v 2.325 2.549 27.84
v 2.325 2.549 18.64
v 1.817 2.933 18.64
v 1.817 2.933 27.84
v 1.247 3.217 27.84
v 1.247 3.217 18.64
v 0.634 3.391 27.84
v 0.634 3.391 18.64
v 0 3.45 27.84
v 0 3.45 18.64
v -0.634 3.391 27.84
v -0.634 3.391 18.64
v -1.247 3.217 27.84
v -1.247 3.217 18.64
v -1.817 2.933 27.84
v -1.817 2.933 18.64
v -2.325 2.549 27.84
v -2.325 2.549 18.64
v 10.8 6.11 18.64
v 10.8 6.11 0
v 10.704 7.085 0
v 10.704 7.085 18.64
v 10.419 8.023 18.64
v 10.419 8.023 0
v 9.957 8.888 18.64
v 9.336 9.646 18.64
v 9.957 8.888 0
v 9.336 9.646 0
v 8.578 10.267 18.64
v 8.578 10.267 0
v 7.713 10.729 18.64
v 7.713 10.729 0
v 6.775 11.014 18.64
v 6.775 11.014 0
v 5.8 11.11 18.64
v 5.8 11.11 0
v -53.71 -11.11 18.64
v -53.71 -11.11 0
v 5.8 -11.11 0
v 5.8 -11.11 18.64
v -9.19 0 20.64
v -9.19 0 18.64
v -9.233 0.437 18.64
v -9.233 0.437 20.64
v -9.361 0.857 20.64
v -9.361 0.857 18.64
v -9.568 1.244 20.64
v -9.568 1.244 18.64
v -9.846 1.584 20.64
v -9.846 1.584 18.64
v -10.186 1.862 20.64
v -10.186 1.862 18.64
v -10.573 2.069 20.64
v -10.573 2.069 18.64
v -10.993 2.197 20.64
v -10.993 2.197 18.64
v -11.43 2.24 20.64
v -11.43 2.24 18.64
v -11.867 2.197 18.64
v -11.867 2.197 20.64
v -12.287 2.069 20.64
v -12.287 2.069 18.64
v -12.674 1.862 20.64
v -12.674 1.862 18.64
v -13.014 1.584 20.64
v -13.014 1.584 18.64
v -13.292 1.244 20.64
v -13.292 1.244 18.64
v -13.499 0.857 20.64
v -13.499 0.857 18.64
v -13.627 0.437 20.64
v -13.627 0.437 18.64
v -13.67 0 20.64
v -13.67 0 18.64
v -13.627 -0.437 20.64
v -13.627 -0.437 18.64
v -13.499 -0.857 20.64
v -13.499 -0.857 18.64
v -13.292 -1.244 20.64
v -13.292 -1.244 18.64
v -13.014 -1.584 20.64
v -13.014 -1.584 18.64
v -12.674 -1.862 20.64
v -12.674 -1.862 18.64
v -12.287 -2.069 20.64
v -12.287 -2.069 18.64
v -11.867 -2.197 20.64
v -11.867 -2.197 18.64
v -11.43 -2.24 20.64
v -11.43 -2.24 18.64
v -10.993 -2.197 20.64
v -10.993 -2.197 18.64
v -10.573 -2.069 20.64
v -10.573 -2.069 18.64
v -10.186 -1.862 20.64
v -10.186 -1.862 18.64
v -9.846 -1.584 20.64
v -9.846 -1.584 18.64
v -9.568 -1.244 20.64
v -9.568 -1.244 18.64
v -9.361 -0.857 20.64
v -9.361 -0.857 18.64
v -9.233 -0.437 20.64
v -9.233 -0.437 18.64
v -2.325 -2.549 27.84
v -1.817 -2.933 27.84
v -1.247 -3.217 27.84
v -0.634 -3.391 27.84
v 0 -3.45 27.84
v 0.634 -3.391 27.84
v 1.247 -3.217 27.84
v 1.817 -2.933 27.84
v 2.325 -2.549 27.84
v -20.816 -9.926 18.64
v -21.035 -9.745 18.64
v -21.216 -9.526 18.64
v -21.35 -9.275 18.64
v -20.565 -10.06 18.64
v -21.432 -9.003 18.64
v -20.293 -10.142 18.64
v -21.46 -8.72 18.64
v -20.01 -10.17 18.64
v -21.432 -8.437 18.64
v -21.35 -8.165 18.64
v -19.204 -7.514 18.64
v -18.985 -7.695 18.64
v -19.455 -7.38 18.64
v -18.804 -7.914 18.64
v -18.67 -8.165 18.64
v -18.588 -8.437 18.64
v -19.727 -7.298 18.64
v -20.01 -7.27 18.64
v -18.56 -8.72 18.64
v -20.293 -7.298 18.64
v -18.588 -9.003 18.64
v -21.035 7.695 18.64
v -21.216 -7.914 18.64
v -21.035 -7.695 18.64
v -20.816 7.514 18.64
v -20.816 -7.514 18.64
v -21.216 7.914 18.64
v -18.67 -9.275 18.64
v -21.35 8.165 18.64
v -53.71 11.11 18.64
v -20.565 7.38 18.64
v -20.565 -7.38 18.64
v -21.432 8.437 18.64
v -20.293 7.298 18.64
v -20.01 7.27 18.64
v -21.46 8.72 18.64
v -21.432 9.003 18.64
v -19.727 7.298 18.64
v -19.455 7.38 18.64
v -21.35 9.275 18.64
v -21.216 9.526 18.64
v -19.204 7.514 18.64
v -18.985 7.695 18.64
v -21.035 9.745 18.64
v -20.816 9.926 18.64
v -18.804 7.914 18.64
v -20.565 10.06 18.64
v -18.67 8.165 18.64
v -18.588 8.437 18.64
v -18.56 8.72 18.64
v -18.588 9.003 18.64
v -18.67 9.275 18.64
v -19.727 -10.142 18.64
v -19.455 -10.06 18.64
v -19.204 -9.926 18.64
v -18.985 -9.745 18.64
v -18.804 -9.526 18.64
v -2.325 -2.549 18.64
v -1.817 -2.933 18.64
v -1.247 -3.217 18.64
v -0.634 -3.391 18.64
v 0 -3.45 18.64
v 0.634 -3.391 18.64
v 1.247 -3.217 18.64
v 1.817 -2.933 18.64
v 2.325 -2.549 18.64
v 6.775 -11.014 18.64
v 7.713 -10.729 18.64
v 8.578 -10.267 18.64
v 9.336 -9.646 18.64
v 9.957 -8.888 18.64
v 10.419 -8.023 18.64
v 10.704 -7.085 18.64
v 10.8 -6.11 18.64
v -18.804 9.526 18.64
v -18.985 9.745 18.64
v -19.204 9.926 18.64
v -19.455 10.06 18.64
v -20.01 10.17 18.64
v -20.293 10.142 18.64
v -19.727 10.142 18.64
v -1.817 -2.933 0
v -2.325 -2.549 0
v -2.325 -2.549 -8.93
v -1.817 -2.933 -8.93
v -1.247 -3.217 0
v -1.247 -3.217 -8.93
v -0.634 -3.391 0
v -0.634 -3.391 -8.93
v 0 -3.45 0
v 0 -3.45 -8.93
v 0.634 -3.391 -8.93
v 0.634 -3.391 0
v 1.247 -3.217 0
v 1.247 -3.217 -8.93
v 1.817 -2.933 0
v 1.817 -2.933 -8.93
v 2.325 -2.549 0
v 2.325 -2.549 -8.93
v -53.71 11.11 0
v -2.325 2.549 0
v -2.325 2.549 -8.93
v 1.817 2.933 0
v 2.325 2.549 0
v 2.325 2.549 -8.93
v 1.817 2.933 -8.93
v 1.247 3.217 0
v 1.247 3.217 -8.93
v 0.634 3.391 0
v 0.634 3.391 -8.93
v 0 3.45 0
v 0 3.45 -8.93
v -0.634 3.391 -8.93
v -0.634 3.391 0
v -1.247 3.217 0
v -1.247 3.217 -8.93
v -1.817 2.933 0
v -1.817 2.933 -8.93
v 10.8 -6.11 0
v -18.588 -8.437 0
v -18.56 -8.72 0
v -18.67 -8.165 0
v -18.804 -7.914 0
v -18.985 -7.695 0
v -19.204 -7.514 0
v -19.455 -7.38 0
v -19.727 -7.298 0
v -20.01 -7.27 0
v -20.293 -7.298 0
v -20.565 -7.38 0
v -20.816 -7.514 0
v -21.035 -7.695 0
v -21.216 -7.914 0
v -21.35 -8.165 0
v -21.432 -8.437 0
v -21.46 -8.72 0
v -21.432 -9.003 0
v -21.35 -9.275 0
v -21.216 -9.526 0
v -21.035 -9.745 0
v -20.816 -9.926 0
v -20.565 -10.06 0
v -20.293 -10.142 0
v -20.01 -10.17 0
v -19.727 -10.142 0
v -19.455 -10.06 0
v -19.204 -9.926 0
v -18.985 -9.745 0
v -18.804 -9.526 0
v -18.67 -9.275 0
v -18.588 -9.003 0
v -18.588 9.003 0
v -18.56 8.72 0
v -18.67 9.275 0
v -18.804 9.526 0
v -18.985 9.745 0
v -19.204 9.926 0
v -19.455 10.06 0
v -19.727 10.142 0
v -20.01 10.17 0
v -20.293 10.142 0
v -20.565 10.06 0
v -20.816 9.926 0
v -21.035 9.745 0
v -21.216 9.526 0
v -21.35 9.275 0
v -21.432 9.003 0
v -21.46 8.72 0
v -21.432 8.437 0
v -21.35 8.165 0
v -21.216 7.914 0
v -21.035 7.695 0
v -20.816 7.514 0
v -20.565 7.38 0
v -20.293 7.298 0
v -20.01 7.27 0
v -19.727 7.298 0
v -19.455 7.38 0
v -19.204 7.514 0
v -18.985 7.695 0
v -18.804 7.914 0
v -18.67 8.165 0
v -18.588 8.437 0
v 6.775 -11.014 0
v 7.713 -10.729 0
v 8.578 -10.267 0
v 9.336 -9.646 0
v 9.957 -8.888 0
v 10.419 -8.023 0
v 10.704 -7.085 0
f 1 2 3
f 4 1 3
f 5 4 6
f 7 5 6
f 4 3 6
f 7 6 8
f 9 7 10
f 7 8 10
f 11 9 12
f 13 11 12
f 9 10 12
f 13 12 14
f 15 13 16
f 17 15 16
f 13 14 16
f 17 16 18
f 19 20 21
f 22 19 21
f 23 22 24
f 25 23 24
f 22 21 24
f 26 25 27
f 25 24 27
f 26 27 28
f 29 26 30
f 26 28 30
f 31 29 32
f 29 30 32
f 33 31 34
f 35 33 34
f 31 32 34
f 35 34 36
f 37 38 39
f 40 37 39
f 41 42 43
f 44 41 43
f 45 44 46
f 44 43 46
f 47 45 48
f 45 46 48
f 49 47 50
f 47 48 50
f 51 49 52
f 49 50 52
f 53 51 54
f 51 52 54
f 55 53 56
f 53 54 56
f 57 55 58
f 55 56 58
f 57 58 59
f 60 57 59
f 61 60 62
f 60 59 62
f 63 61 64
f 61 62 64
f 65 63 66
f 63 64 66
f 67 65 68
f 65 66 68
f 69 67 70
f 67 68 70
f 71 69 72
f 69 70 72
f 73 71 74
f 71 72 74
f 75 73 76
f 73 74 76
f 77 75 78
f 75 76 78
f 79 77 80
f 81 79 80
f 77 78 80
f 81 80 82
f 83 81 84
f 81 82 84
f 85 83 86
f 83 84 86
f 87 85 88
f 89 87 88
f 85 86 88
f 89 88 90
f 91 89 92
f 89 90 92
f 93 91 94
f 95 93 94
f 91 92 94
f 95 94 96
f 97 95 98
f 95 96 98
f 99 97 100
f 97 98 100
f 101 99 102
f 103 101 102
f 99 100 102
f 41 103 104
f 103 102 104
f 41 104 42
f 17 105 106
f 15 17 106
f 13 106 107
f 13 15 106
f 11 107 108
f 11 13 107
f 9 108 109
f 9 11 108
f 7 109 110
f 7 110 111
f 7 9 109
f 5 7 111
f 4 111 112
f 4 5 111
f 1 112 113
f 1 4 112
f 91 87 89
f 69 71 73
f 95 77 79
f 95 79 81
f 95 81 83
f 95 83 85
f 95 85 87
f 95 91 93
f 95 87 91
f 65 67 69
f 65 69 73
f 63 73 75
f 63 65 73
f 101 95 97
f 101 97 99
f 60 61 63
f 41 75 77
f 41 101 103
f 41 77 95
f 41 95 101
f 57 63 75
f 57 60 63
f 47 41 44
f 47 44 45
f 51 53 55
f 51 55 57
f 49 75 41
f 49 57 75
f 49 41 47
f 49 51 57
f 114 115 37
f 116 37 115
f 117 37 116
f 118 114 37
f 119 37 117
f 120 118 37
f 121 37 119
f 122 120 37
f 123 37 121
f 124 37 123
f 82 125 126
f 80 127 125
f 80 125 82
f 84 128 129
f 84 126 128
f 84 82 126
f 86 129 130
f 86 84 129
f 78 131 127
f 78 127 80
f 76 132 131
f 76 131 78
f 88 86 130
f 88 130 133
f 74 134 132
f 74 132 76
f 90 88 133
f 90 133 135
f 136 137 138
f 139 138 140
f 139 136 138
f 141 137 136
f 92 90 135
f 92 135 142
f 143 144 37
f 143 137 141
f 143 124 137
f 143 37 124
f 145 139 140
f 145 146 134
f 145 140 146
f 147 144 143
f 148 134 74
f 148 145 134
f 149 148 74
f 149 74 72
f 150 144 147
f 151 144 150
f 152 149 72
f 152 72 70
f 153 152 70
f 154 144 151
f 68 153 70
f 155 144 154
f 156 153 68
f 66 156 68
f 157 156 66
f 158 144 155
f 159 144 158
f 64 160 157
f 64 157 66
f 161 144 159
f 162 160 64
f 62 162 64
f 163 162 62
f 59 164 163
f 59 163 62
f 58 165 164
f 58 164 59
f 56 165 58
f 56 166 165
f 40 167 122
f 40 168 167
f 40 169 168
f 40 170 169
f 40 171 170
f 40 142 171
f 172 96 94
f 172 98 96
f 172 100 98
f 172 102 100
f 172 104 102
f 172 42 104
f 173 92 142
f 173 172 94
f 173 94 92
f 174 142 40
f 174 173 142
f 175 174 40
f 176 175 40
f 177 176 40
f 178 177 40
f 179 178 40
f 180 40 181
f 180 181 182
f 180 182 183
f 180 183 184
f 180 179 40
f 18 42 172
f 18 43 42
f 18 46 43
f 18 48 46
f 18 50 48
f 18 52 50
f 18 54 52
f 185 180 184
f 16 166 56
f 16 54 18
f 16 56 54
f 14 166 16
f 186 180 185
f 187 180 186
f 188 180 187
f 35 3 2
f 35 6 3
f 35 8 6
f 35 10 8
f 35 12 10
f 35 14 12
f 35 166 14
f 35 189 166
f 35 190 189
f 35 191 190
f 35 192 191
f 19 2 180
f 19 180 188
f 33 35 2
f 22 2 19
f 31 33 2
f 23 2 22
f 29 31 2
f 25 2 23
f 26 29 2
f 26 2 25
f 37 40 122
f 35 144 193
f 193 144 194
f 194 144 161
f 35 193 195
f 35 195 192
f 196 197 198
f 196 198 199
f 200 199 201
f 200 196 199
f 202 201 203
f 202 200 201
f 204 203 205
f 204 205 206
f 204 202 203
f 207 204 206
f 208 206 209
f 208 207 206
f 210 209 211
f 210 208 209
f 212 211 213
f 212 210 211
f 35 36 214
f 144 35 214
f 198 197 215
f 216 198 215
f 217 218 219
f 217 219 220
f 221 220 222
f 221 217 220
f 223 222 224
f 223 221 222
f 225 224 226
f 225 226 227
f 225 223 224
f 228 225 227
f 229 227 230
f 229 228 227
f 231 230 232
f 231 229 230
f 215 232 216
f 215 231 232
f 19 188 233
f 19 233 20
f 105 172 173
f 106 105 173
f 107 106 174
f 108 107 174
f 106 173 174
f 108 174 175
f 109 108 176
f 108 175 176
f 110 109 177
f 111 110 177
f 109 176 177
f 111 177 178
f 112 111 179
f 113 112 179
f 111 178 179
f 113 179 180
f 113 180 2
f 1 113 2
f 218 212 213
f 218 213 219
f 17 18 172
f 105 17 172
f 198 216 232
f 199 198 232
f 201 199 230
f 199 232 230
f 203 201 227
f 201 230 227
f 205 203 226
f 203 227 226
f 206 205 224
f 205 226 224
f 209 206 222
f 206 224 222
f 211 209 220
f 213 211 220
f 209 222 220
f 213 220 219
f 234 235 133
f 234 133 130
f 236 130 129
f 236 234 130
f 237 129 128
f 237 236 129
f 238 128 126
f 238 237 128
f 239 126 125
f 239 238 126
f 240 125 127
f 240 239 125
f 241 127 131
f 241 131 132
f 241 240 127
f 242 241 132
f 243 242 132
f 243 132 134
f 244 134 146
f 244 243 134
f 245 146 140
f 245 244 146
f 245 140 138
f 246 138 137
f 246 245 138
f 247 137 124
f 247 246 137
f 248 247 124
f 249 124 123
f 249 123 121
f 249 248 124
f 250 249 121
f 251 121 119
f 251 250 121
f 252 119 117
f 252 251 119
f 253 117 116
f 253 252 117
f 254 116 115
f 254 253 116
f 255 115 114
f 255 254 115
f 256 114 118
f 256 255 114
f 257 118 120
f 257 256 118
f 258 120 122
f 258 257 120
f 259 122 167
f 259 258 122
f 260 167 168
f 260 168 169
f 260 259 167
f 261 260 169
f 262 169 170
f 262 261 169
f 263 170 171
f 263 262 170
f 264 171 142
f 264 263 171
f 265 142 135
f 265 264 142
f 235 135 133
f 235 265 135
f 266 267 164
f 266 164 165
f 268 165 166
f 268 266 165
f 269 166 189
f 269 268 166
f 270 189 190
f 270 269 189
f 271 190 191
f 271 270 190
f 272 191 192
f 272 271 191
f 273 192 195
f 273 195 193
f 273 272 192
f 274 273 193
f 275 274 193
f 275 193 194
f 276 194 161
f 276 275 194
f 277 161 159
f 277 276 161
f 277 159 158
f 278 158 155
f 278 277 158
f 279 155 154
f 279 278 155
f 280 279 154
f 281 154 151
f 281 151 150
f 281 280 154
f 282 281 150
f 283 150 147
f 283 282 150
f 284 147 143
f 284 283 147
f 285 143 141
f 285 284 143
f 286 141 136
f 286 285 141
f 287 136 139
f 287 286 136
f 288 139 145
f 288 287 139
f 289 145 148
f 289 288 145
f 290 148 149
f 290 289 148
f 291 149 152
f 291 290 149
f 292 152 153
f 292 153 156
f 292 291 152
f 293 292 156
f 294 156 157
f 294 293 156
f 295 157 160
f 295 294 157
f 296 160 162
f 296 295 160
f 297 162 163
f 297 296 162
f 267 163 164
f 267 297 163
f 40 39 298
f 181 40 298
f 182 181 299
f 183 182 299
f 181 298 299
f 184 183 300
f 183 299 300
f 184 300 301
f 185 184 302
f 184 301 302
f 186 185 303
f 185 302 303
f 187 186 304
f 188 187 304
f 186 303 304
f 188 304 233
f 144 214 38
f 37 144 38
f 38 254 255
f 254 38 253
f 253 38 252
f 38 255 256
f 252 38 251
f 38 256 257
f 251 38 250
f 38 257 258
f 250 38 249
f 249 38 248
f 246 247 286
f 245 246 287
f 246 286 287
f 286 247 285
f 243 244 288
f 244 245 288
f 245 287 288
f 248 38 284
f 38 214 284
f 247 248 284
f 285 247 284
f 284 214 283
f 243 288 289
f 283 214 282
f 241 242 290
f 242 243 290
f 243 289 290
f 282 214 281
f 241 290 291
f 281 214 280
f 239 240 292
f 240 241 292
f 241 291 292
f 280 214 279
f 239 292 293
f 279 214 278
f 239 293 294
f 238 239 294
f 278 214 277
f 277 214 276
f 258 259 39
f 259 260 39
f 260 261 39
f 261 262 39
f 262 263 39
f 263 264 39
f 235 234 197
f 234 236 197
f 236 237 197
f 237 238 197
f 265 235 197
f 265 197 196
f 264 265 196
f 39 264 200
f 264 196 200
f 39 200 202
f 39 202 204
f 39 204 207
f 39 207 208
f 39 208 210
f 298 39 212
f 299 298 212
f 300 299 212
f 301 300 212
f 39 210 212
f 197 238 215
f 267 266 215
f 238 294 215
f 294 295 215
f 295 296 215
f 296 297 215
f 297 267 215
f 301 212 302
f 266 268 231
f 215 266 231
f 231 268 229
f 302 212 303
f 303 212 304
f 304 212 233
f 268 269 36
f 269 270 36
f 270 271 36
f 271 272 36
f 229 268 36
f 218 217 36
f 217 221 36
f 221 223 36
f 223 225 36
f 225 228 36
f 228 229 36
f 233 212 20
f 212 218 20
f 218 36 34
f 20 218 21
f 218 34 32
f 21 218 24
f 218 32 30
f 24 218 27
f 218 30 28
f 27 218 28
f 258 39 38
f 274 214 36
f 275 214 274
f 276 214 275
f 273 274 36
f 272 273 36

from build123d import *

# Parameters (mm, degrees)
F0_R     = 1.45
F0_R_2   = 2.24
F0_R_3   = 4.865
F0_R_4   = 3.415
F1_DEPTH = 18.64
F3_DEPTH = 9.2
F4_R     = 2.24
F5_DEPTH = 2
F6_W     = 4.65
F6_H     = 5.0977936404
F7_DEPTH = 8.93


with BuildPart() as f1:
    # F0 (on Top) → F1 (new body)
    with BuildSketch(Plane.XY):
        with BuildLine():
            Line((-53.71, -11.11), (5.8, -11.11))
            ThreePointArc((5.8, -11.11), (9.3355339059, -9.6455339059), (10.8, -6.11))
            Line((10.8, -6.11), (10.8, 6.11))
            ThreePointArc((10.8, 6.11), (9.3355339059, 9.6455339059), (5.8, 11.11))
            Line((5.8, 11.11), (-53.71, 11.11))
            Line((-53.71, 11.11), (-53.71, -11.11))
        make_face()
        with Locations((-20.01, -8.72)):
            Circle(F0_R, mode=Mode.SUBTRACT)
        with Locations((-11.43, 0)):
            Circle(F0_R_2, mode=Mode.SUBTRACT)
        Circle(F0_R_3, mode=Mode.SUBTRACT)
        with Locations((-20.01, 8.72)):
            Circle(F0_R, mode=Mode.SUBTRACT)
        Circle(F0_R_3)
        Circle(F0_R_4, mode=Mode.SUBTRACT)
        Circle(F0_R_4)
        with Locations((-11.43, 0)):
            Circle(F0_R_2)
    extrude(amount=F1_DEPTH)

    # F2 (on face) → F3 (join)
    with BuildSketch(Plane.XY.offset(18.64)):
        with BuildLine():
            Line((-2.325, 2.5488968202), (-2.325, -2.5488968202))
            ThreePointArc((-2.325, -2.5488968202), (0, -3.45), (2.325, -2.5488968202))
            Line((2.325, -2.5488968202), (2.325, 2.5488968202))
            Line((2.325, 2.5488968202), (-2.325, 2.5488968202))
        make_face()
        with BuildLine():
            ThreePointArc((2.325, 2.5488968202), (0, 3.45), (-2.325, 2.5488968202))
            Line((-2.325, 2.5488968202), (2.325, 2.5488968202))
        make_face()
    extrude(amount=F3_DEPTH)

    # F4 (on face) → F5 (join)
    with BuildSketch(Plane.XY.offset(18.64)):
        with Locations((-11.43, 0)):
            Circle(F4_R)
    extrude(amount=F5_DEPTH)

    # F6 (on face) → F7 (join)
    with BuildSketch(Plane.XY):
        with BuildLine():
            Line((-2.325, 2.5488968202), (2.325, 2.5488968202))
            ThreePointArc((2.325, 2.5488968202), (0, 3.45), (-2.325, 2.5488968202))
        make_face()
        with BuildLine():
            ThreePointArc((-2.325, -2.5488968202), (0, -3.45), (2.325, -2.5488968202))
            Line((2.325, -2.5488968202), (-2.325, -2.5488968202))
        make_face()
        Rectangle(F6_W, F6_H)
    extrude(amount=-F7_DEPTH)


solid = f1.part
